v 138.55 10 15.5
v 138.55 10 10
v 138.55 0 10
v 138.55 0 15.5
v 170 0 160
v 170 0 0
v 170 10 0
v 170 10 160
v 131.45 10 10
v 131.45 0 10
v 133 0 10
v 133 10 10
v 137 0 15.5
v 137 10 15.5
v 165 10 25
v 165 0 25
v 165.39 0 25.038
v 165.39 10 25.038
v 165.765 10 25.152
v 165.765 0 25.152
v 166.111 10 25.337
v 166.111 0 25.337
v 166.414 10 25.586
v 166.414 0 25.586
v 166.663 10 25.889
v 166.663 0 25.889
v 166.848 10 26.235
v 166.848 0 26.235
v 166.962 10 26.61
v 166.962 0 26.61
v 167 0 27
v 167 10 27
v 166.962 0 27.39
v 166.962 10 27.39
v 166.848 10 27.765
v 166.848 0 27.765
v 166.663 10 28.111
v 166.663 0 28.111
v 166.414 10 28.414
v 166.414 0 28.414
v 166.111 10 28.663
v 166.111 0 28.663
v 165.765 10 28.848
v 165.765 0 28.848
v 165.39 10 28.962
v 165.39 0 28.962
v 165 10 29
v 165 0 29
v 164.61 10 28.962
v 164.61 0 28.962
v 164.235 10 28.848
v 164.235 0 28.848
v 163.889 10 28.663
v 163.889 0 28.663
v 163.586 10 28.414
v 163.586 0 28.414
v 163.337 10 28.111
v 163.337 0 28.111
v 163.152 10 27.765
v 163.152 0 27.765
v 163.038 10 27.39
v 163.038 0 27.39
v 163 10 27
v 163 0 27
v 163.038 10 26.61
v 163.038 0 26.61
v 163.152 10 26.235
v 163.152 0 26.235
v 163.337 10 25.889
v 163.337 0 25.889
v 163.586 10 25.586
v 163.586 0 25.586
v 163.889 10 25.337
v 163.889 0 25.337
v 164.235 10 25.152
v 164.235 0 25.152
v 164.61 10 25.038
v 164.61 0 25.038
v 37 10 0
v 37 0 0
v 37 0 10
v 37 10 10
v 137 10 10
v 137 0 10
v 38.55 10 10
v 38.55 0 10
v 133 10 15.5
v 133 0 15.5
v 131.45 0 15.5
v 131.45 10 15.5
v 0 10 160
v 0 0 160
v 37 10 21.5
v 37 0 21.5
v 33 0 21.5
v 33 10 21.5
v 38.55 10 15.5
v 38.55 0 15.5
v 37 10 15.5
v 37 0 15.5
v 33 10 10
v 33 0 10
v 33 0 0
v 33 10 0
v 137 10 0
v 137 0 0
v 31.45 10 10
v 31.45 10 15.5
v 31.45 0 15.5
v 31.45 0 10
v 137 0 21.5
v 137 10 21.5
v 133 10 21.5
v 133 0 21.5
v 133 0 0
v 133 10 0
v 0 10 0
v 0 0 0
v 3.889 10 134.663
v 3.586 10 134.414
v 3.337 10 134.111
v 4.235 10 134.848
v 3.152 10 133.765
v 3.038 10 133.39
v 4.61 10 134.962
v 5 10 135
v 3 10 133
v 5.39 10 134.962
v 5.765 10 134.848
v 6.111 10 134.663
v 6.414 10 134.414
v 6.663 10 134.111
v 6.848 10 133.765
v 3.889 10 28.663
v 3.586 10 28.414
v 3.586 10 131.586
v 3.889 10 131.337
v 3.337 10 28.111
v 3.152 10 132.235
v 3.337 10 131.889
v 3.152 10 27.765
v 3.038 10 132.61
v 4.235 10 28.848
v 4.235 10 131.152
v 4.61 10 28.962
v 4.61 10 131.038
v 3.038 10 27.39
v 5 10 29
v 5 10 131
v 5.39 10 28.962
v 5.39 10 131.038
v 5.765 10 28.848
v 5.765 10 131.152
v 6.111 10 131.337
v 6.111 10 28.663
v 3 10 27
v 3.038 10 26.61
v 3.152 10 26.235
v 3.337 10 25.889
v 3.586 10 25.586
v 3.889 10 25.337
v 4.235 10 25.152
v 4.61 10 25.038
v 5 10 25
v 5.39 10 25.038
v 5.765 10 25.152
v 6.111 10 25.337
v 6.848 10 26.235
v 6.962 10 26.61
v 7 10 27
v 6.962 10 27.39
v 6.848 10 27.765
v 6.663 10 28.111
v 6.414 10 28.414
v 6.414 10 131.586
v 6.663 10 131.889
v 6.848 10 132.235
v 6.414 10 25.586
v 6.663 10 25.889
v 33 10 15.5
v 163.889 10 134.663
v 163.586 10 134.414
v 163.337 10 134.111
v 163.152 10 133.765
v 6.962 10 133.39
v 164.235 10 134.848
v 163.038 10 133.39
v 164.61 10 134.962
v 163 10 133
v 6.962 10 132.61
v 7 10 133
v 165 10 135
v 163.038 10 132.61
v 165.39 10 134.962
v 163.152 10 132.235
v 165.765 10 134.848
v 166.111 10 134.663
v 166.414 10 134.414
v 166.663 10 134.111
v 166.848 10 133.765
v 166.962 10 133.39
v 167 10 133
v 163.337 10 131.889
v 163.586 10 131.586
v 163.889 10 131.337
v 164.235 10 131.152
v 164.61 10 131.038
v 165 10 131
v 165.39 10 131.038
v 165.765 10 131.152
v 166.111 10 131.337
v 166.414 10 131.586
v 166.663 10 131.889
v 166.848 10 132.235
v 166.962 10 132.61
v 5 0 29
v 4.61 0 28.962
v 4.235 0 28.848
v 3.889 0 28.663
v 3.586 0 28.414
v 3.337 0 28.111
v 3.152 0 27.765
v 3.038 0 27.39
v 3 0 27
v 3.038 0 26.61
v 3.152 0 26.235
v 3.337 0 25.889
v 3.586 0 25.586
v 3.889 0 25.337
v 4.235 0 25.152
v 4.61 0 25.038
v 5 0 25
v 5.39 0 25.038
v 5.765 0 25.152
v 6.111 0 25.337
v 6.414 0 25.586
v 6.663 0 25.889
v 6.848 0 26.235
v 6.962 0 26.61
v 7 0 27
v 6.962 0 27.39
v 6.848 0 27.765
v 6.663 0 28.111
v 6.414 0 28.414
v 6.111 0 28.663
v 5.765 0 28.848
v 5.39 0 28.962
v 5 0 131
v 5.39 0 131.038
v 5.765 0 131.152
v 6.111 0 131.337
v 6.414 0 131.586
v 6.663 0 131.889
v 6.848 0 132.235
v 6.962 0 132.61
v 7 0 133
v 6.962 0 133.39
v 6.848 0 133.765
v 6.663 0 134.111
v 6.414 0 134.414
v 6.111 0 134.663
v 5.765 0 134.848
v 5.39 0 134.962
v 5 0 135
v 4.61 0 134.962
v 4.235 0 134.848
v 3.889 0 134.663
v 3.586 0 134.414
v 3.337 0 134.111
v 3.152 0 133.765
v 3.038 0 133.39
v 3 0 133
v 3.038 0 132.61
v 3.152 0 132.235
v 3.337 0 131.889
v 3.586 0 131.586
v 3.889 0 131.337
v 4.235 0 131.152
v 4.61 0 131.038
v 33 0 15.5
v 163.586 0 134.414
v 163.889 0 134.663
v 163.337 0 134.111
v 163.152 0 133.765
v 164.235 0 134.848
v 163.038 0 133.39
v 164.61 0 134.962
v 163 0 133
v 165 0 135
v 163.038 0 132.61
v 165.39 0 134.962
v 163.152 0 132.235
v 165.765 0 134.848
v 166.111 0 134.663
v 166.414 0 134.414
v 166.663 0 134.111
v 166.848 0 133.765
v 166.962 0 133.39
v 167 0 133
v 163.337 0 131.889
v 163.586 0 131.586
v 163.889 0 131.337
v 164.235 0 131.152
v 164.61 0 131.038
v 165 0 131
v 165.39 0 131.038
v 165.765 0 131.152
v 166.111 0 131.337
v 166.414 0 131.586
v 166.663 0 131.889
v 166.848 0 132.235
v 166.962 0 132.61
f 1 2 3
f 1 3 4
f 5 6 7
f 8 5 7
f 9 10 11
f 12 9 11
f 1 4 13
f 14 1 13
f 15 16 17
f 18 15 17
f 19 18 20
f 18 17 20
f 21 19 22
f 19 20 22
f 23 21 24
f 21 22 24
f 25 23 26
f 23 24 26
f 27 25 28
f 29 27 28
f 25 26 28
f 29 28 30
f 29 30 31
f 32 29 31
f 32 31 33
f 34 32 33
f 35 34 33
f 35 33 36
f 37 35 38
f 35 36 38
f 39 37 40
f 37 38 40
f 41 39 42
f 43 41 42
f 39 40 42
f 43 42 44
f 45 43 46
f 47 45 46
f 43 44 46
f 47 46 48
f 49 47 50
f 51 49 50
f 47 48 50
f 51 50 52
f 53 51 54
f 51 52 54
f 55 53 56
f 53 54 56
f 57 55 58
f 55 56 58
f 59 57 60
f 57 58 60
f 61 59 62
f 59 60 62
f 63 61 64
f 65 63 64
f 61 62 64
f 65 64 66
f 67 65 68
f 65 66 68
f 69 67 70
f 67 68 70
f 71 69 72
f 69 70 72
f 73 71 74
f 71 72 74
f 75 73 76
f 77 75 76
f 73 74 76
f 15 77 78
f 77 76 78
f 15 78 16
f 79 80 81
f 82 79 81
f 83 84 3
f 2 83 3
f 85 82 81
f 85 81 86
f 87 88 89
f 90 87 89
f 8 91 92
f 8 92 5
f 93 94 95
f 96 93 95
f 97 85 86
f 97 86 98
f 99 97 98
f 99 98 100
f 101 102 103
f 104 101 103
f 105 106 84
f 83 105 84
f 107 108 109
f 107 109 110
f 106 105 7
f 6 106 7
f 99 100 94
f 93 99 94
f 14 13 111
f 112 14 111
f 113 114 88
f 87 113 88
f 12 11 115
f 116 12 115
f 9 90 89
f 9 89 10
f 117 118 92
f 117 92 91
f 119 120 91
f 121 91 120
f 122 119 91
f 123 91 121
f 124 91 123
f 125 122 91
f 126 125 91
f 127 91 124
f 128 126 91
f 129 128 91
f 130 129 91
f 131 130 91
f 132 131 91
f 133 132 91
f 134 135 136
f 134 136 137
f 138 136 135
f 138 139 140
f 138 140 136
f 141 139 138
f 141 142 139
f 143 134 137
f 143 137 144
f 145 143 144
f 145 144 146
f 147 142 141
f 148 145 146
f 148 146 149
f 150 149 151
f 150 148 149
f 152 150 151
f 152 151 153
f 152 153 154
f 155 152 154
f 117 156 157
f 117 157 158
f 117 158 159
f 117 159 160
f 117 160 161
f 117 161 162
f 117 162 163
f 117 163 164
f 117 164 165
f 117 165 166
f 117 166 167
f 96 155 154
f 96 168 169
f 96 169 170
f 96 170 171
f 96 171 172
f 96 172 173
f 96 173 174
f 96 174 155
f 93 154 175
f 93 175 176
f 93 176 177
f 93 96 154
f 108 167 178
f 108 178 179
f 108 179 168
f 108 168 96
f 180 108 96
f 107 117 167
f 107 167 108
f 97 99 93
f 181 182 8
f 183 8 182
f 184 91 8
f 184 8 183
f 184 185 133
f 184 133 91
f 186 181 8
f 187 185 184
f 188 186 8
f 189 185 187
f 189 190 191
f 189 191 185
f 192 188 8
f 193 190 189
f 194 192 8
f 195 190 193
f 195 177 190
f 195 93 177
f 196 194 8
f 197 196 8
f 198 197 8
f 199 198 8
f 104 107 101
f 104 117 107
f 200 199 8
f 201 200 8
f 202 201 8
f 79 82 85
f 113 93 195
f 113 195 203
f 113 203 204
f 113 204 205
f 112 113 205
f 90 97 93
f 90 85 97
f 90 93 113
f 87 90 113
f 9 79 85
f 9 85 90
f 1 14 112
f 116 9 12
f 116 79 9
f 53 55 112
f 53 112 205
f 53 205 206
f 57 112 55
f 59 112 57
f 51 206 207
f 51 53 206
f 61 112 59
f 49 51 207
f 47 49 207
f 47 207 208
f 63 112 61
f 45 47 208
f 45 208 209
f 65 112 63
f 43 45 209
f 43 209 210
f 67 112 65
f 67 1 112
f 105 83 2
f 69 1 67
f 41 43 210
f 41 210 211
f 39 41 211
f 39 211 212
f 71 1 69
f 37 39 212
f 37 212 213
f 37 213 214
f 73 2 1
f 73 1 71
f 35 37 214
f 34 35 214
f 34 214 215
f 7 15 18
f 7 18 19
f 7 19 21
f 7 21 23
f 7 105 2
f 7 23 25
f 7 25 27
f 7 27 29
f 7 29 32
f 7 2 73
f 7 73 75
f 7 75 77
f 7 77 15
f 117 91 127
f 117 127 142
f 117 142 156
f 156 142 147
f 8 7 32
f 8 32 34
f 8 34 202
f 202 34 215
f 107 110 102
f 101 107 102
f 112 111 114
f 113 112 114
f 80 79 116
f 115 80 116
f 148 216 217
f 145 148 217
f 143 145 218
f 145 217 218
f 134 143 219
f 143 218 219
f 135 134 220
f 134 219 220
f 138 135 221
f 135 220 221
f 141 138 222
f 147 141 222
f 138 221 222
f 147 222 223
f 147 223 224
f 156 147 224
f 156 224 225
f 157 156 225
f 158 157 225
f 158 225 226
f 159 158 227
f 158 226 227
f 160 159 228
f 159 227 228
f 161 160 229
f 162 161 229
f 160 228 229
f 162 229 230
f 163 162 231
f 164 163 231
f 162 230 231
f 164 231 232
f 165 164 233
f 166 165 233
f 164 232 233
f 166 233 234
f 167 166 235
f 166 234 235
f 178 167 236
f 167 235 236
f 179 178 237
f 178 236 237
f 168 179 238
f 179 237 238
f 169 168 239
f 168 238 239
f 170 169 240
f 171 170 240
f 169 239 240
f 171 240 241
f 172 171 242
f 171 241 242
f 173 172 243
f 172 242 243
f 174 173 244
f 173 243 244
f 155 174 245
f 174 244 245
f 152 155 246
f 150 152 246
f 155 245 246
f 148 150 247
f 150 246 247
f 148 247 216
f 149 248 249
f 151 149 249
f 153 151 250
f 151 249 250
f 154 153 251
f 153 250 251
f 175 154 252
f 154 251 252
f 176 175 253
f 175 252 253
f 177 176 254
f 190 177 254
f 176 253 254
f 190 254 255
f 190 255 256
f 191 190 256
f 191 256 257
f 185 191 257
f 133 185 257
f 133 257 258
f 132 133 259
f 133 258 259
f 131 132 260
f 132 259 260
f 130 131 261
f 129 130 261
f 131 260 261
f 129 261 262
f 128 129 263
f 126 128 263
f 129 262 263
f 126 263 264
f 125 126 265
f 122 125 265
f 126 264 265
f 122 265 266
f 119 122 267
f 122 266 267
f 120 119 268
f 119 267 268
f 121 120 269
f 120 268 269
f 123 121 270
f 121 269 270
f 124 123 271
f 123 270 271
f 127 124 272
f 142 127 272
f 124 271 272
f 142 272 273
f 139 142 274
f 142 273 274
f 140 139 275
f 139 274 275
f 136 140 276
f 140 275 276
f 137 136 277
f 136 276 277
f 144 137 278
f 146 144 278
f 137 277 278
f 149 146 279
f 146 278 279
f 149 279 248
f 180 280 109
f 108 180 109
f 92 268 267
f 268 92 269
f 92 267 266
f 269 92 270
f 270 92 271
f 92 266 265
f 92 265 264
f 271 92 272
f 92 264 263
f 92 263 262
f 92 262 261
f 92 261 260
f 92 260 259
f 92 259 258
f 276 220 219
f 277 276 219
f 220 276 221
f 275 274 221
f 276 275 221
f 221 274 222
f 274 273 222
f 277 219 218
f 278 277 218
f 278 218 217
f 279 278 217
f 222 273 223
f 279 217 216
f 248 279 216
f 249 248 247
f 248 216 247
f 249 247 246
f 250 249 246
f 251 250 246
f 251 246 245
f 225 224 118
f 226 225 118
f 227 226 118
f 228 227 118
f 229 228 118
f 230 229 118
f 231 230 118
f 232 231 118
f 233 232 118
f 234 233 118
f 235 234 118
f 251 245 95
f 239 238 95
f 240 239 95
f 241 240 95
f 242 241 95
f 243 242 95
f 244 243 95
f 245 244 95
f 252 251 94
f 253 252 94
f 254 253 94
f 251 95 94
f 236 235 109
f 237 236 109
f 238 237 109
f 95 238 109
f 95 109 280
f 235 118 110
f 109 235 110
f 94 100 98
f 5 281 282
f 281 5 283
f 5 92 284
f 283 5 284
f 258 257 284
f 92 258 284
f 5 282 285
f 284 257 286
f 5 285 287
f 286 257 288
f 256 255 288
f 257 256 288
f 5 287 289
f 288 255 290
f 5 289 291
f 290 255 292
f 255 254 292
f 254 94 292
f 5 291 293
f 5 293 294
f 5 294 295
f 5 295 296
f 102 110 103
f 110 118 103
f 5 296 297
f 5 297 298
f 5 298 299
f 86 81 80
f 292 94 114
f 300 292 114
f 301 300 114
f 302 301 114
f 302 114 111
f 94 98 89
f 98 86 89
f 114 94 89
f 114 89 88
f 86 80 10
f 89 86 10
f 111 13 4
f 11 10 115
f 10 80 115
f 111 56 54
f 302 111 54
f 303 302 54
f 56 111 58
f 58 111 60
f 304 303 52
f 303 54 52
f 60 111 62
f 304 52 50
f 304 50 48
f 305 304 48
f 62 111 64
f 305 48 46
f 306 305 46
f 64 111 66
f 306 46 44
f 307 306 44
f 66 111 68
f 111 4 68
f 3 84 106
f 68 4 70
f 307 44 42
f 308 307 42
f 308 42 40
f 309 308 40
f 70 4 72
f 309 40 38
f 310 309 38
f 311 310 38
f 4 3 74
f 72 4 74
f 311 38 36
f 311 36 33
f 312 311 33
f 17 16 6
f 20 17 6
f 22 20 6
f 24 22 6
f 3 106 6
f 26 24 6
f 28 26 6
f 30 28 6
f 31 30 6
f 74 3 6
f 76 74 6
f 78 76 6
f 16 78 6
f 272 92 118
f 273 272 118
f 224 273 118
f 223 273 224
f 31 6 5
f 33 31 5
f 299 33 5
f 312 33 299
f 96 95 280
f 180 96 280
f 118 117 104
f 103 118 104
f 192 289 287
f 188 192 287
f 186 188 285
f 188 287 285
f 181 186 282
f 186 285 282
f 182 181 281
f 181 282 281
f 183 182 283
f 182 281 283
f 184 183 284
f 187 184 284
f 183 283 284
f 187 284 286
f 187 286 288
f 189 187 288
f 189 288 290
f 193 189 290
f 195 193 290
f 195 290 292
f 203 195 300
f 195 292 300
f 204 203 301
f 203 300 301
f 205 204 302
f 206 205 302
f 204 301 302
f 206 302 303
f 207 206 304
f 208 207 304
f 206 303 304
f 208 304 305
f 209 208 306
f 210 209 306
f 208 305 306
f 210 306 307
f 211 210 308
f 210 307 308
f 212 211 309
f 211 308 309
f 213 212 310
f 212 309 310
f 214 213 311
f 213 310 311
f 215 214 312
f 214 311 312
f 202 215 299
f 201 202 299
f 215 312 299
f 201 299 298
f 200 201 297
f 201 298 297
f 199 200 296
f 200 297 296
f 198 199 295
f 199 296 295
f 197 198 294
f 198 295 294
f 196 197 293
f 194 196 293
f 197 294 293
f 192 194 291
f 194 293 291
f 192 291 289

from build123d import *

# Parameters (mm, degrees)
SKETCH1_W               = 170
SKETCH1_H               = 10
BOSS_EXTRUDE1_DEPTH     = 160
ESQUISSE1_R             = 2
ENL_V_MAT_EXTRU_2_DEPTH = 10
ENL_V_MAT_EXTRU_3_DEPTH = 10


with BuildPart() as part:
    # Sketch1 → Boss-Extrude1 (new body)
    with BuildSketch(Plane.XY):
        with Locations((85, 5)):
            Rectangle(SKETCH1_W, SKETCH1_H)
    extrude(amount=BOSS_EXTRUDE1_DEPTH)

    # Esquisse1 → Enlèv. mat.-Extru.2 (cut)
    with BuildSketch(Plane.XZ):
        with Locations(Location((5, 133, 0), (0, 0, 270))):
            Circle(ESQUISSE1_R)
        with Locations(Location((5, 27, 0), (0, 0, 90))):
            Circle(ESQUISSE1_R)
        with Locations(Location((165, 27, 0), (0, 0, 270))):
            Circle(ESQUISSE1_R)
        with Locations(Location((165, 133, 0), (0, 0, 90))):
            Circle(ESQUISSE1_R)
    extrude(amount=-ENL_V_MAT_EXTRU_2_DEPTH, mode=Mode.SUBTRACT)

    # Esquisse2 → Enlèv. mat.-Extru.3 (cut)
    with BuildSketch(Plane(origin=(0, 0, 0), x_dir=(-1, 0, 0), z_dir=(0, -1, 0))):
        Polygon((-133, -10), (-133, 0), (-137, 0), (-137, -10), (-138.55, -10), (-138.55, -15.5), (-137, -15.5), (-137, -21.5), (-133, -21.5), (-133, -15.5), (-131.45, -15.5), (-131.45, -10), align=None)
        Polygon((-33, -10), (-33, 0), (-37, 0), (-37, -10), (-38.55, -10), (-38.55, -15.5), (-37, -15.5), (-37, -21.5), (-33, -21.5), (-33, -15.5), (-31.45, -15.5), (-31.45, -10), align=None)
    extrude(amount=-ENL_V_MAT_EXTRU_3_DEPTH, mode=Mode.SUBTRACT)


solid = part.part
